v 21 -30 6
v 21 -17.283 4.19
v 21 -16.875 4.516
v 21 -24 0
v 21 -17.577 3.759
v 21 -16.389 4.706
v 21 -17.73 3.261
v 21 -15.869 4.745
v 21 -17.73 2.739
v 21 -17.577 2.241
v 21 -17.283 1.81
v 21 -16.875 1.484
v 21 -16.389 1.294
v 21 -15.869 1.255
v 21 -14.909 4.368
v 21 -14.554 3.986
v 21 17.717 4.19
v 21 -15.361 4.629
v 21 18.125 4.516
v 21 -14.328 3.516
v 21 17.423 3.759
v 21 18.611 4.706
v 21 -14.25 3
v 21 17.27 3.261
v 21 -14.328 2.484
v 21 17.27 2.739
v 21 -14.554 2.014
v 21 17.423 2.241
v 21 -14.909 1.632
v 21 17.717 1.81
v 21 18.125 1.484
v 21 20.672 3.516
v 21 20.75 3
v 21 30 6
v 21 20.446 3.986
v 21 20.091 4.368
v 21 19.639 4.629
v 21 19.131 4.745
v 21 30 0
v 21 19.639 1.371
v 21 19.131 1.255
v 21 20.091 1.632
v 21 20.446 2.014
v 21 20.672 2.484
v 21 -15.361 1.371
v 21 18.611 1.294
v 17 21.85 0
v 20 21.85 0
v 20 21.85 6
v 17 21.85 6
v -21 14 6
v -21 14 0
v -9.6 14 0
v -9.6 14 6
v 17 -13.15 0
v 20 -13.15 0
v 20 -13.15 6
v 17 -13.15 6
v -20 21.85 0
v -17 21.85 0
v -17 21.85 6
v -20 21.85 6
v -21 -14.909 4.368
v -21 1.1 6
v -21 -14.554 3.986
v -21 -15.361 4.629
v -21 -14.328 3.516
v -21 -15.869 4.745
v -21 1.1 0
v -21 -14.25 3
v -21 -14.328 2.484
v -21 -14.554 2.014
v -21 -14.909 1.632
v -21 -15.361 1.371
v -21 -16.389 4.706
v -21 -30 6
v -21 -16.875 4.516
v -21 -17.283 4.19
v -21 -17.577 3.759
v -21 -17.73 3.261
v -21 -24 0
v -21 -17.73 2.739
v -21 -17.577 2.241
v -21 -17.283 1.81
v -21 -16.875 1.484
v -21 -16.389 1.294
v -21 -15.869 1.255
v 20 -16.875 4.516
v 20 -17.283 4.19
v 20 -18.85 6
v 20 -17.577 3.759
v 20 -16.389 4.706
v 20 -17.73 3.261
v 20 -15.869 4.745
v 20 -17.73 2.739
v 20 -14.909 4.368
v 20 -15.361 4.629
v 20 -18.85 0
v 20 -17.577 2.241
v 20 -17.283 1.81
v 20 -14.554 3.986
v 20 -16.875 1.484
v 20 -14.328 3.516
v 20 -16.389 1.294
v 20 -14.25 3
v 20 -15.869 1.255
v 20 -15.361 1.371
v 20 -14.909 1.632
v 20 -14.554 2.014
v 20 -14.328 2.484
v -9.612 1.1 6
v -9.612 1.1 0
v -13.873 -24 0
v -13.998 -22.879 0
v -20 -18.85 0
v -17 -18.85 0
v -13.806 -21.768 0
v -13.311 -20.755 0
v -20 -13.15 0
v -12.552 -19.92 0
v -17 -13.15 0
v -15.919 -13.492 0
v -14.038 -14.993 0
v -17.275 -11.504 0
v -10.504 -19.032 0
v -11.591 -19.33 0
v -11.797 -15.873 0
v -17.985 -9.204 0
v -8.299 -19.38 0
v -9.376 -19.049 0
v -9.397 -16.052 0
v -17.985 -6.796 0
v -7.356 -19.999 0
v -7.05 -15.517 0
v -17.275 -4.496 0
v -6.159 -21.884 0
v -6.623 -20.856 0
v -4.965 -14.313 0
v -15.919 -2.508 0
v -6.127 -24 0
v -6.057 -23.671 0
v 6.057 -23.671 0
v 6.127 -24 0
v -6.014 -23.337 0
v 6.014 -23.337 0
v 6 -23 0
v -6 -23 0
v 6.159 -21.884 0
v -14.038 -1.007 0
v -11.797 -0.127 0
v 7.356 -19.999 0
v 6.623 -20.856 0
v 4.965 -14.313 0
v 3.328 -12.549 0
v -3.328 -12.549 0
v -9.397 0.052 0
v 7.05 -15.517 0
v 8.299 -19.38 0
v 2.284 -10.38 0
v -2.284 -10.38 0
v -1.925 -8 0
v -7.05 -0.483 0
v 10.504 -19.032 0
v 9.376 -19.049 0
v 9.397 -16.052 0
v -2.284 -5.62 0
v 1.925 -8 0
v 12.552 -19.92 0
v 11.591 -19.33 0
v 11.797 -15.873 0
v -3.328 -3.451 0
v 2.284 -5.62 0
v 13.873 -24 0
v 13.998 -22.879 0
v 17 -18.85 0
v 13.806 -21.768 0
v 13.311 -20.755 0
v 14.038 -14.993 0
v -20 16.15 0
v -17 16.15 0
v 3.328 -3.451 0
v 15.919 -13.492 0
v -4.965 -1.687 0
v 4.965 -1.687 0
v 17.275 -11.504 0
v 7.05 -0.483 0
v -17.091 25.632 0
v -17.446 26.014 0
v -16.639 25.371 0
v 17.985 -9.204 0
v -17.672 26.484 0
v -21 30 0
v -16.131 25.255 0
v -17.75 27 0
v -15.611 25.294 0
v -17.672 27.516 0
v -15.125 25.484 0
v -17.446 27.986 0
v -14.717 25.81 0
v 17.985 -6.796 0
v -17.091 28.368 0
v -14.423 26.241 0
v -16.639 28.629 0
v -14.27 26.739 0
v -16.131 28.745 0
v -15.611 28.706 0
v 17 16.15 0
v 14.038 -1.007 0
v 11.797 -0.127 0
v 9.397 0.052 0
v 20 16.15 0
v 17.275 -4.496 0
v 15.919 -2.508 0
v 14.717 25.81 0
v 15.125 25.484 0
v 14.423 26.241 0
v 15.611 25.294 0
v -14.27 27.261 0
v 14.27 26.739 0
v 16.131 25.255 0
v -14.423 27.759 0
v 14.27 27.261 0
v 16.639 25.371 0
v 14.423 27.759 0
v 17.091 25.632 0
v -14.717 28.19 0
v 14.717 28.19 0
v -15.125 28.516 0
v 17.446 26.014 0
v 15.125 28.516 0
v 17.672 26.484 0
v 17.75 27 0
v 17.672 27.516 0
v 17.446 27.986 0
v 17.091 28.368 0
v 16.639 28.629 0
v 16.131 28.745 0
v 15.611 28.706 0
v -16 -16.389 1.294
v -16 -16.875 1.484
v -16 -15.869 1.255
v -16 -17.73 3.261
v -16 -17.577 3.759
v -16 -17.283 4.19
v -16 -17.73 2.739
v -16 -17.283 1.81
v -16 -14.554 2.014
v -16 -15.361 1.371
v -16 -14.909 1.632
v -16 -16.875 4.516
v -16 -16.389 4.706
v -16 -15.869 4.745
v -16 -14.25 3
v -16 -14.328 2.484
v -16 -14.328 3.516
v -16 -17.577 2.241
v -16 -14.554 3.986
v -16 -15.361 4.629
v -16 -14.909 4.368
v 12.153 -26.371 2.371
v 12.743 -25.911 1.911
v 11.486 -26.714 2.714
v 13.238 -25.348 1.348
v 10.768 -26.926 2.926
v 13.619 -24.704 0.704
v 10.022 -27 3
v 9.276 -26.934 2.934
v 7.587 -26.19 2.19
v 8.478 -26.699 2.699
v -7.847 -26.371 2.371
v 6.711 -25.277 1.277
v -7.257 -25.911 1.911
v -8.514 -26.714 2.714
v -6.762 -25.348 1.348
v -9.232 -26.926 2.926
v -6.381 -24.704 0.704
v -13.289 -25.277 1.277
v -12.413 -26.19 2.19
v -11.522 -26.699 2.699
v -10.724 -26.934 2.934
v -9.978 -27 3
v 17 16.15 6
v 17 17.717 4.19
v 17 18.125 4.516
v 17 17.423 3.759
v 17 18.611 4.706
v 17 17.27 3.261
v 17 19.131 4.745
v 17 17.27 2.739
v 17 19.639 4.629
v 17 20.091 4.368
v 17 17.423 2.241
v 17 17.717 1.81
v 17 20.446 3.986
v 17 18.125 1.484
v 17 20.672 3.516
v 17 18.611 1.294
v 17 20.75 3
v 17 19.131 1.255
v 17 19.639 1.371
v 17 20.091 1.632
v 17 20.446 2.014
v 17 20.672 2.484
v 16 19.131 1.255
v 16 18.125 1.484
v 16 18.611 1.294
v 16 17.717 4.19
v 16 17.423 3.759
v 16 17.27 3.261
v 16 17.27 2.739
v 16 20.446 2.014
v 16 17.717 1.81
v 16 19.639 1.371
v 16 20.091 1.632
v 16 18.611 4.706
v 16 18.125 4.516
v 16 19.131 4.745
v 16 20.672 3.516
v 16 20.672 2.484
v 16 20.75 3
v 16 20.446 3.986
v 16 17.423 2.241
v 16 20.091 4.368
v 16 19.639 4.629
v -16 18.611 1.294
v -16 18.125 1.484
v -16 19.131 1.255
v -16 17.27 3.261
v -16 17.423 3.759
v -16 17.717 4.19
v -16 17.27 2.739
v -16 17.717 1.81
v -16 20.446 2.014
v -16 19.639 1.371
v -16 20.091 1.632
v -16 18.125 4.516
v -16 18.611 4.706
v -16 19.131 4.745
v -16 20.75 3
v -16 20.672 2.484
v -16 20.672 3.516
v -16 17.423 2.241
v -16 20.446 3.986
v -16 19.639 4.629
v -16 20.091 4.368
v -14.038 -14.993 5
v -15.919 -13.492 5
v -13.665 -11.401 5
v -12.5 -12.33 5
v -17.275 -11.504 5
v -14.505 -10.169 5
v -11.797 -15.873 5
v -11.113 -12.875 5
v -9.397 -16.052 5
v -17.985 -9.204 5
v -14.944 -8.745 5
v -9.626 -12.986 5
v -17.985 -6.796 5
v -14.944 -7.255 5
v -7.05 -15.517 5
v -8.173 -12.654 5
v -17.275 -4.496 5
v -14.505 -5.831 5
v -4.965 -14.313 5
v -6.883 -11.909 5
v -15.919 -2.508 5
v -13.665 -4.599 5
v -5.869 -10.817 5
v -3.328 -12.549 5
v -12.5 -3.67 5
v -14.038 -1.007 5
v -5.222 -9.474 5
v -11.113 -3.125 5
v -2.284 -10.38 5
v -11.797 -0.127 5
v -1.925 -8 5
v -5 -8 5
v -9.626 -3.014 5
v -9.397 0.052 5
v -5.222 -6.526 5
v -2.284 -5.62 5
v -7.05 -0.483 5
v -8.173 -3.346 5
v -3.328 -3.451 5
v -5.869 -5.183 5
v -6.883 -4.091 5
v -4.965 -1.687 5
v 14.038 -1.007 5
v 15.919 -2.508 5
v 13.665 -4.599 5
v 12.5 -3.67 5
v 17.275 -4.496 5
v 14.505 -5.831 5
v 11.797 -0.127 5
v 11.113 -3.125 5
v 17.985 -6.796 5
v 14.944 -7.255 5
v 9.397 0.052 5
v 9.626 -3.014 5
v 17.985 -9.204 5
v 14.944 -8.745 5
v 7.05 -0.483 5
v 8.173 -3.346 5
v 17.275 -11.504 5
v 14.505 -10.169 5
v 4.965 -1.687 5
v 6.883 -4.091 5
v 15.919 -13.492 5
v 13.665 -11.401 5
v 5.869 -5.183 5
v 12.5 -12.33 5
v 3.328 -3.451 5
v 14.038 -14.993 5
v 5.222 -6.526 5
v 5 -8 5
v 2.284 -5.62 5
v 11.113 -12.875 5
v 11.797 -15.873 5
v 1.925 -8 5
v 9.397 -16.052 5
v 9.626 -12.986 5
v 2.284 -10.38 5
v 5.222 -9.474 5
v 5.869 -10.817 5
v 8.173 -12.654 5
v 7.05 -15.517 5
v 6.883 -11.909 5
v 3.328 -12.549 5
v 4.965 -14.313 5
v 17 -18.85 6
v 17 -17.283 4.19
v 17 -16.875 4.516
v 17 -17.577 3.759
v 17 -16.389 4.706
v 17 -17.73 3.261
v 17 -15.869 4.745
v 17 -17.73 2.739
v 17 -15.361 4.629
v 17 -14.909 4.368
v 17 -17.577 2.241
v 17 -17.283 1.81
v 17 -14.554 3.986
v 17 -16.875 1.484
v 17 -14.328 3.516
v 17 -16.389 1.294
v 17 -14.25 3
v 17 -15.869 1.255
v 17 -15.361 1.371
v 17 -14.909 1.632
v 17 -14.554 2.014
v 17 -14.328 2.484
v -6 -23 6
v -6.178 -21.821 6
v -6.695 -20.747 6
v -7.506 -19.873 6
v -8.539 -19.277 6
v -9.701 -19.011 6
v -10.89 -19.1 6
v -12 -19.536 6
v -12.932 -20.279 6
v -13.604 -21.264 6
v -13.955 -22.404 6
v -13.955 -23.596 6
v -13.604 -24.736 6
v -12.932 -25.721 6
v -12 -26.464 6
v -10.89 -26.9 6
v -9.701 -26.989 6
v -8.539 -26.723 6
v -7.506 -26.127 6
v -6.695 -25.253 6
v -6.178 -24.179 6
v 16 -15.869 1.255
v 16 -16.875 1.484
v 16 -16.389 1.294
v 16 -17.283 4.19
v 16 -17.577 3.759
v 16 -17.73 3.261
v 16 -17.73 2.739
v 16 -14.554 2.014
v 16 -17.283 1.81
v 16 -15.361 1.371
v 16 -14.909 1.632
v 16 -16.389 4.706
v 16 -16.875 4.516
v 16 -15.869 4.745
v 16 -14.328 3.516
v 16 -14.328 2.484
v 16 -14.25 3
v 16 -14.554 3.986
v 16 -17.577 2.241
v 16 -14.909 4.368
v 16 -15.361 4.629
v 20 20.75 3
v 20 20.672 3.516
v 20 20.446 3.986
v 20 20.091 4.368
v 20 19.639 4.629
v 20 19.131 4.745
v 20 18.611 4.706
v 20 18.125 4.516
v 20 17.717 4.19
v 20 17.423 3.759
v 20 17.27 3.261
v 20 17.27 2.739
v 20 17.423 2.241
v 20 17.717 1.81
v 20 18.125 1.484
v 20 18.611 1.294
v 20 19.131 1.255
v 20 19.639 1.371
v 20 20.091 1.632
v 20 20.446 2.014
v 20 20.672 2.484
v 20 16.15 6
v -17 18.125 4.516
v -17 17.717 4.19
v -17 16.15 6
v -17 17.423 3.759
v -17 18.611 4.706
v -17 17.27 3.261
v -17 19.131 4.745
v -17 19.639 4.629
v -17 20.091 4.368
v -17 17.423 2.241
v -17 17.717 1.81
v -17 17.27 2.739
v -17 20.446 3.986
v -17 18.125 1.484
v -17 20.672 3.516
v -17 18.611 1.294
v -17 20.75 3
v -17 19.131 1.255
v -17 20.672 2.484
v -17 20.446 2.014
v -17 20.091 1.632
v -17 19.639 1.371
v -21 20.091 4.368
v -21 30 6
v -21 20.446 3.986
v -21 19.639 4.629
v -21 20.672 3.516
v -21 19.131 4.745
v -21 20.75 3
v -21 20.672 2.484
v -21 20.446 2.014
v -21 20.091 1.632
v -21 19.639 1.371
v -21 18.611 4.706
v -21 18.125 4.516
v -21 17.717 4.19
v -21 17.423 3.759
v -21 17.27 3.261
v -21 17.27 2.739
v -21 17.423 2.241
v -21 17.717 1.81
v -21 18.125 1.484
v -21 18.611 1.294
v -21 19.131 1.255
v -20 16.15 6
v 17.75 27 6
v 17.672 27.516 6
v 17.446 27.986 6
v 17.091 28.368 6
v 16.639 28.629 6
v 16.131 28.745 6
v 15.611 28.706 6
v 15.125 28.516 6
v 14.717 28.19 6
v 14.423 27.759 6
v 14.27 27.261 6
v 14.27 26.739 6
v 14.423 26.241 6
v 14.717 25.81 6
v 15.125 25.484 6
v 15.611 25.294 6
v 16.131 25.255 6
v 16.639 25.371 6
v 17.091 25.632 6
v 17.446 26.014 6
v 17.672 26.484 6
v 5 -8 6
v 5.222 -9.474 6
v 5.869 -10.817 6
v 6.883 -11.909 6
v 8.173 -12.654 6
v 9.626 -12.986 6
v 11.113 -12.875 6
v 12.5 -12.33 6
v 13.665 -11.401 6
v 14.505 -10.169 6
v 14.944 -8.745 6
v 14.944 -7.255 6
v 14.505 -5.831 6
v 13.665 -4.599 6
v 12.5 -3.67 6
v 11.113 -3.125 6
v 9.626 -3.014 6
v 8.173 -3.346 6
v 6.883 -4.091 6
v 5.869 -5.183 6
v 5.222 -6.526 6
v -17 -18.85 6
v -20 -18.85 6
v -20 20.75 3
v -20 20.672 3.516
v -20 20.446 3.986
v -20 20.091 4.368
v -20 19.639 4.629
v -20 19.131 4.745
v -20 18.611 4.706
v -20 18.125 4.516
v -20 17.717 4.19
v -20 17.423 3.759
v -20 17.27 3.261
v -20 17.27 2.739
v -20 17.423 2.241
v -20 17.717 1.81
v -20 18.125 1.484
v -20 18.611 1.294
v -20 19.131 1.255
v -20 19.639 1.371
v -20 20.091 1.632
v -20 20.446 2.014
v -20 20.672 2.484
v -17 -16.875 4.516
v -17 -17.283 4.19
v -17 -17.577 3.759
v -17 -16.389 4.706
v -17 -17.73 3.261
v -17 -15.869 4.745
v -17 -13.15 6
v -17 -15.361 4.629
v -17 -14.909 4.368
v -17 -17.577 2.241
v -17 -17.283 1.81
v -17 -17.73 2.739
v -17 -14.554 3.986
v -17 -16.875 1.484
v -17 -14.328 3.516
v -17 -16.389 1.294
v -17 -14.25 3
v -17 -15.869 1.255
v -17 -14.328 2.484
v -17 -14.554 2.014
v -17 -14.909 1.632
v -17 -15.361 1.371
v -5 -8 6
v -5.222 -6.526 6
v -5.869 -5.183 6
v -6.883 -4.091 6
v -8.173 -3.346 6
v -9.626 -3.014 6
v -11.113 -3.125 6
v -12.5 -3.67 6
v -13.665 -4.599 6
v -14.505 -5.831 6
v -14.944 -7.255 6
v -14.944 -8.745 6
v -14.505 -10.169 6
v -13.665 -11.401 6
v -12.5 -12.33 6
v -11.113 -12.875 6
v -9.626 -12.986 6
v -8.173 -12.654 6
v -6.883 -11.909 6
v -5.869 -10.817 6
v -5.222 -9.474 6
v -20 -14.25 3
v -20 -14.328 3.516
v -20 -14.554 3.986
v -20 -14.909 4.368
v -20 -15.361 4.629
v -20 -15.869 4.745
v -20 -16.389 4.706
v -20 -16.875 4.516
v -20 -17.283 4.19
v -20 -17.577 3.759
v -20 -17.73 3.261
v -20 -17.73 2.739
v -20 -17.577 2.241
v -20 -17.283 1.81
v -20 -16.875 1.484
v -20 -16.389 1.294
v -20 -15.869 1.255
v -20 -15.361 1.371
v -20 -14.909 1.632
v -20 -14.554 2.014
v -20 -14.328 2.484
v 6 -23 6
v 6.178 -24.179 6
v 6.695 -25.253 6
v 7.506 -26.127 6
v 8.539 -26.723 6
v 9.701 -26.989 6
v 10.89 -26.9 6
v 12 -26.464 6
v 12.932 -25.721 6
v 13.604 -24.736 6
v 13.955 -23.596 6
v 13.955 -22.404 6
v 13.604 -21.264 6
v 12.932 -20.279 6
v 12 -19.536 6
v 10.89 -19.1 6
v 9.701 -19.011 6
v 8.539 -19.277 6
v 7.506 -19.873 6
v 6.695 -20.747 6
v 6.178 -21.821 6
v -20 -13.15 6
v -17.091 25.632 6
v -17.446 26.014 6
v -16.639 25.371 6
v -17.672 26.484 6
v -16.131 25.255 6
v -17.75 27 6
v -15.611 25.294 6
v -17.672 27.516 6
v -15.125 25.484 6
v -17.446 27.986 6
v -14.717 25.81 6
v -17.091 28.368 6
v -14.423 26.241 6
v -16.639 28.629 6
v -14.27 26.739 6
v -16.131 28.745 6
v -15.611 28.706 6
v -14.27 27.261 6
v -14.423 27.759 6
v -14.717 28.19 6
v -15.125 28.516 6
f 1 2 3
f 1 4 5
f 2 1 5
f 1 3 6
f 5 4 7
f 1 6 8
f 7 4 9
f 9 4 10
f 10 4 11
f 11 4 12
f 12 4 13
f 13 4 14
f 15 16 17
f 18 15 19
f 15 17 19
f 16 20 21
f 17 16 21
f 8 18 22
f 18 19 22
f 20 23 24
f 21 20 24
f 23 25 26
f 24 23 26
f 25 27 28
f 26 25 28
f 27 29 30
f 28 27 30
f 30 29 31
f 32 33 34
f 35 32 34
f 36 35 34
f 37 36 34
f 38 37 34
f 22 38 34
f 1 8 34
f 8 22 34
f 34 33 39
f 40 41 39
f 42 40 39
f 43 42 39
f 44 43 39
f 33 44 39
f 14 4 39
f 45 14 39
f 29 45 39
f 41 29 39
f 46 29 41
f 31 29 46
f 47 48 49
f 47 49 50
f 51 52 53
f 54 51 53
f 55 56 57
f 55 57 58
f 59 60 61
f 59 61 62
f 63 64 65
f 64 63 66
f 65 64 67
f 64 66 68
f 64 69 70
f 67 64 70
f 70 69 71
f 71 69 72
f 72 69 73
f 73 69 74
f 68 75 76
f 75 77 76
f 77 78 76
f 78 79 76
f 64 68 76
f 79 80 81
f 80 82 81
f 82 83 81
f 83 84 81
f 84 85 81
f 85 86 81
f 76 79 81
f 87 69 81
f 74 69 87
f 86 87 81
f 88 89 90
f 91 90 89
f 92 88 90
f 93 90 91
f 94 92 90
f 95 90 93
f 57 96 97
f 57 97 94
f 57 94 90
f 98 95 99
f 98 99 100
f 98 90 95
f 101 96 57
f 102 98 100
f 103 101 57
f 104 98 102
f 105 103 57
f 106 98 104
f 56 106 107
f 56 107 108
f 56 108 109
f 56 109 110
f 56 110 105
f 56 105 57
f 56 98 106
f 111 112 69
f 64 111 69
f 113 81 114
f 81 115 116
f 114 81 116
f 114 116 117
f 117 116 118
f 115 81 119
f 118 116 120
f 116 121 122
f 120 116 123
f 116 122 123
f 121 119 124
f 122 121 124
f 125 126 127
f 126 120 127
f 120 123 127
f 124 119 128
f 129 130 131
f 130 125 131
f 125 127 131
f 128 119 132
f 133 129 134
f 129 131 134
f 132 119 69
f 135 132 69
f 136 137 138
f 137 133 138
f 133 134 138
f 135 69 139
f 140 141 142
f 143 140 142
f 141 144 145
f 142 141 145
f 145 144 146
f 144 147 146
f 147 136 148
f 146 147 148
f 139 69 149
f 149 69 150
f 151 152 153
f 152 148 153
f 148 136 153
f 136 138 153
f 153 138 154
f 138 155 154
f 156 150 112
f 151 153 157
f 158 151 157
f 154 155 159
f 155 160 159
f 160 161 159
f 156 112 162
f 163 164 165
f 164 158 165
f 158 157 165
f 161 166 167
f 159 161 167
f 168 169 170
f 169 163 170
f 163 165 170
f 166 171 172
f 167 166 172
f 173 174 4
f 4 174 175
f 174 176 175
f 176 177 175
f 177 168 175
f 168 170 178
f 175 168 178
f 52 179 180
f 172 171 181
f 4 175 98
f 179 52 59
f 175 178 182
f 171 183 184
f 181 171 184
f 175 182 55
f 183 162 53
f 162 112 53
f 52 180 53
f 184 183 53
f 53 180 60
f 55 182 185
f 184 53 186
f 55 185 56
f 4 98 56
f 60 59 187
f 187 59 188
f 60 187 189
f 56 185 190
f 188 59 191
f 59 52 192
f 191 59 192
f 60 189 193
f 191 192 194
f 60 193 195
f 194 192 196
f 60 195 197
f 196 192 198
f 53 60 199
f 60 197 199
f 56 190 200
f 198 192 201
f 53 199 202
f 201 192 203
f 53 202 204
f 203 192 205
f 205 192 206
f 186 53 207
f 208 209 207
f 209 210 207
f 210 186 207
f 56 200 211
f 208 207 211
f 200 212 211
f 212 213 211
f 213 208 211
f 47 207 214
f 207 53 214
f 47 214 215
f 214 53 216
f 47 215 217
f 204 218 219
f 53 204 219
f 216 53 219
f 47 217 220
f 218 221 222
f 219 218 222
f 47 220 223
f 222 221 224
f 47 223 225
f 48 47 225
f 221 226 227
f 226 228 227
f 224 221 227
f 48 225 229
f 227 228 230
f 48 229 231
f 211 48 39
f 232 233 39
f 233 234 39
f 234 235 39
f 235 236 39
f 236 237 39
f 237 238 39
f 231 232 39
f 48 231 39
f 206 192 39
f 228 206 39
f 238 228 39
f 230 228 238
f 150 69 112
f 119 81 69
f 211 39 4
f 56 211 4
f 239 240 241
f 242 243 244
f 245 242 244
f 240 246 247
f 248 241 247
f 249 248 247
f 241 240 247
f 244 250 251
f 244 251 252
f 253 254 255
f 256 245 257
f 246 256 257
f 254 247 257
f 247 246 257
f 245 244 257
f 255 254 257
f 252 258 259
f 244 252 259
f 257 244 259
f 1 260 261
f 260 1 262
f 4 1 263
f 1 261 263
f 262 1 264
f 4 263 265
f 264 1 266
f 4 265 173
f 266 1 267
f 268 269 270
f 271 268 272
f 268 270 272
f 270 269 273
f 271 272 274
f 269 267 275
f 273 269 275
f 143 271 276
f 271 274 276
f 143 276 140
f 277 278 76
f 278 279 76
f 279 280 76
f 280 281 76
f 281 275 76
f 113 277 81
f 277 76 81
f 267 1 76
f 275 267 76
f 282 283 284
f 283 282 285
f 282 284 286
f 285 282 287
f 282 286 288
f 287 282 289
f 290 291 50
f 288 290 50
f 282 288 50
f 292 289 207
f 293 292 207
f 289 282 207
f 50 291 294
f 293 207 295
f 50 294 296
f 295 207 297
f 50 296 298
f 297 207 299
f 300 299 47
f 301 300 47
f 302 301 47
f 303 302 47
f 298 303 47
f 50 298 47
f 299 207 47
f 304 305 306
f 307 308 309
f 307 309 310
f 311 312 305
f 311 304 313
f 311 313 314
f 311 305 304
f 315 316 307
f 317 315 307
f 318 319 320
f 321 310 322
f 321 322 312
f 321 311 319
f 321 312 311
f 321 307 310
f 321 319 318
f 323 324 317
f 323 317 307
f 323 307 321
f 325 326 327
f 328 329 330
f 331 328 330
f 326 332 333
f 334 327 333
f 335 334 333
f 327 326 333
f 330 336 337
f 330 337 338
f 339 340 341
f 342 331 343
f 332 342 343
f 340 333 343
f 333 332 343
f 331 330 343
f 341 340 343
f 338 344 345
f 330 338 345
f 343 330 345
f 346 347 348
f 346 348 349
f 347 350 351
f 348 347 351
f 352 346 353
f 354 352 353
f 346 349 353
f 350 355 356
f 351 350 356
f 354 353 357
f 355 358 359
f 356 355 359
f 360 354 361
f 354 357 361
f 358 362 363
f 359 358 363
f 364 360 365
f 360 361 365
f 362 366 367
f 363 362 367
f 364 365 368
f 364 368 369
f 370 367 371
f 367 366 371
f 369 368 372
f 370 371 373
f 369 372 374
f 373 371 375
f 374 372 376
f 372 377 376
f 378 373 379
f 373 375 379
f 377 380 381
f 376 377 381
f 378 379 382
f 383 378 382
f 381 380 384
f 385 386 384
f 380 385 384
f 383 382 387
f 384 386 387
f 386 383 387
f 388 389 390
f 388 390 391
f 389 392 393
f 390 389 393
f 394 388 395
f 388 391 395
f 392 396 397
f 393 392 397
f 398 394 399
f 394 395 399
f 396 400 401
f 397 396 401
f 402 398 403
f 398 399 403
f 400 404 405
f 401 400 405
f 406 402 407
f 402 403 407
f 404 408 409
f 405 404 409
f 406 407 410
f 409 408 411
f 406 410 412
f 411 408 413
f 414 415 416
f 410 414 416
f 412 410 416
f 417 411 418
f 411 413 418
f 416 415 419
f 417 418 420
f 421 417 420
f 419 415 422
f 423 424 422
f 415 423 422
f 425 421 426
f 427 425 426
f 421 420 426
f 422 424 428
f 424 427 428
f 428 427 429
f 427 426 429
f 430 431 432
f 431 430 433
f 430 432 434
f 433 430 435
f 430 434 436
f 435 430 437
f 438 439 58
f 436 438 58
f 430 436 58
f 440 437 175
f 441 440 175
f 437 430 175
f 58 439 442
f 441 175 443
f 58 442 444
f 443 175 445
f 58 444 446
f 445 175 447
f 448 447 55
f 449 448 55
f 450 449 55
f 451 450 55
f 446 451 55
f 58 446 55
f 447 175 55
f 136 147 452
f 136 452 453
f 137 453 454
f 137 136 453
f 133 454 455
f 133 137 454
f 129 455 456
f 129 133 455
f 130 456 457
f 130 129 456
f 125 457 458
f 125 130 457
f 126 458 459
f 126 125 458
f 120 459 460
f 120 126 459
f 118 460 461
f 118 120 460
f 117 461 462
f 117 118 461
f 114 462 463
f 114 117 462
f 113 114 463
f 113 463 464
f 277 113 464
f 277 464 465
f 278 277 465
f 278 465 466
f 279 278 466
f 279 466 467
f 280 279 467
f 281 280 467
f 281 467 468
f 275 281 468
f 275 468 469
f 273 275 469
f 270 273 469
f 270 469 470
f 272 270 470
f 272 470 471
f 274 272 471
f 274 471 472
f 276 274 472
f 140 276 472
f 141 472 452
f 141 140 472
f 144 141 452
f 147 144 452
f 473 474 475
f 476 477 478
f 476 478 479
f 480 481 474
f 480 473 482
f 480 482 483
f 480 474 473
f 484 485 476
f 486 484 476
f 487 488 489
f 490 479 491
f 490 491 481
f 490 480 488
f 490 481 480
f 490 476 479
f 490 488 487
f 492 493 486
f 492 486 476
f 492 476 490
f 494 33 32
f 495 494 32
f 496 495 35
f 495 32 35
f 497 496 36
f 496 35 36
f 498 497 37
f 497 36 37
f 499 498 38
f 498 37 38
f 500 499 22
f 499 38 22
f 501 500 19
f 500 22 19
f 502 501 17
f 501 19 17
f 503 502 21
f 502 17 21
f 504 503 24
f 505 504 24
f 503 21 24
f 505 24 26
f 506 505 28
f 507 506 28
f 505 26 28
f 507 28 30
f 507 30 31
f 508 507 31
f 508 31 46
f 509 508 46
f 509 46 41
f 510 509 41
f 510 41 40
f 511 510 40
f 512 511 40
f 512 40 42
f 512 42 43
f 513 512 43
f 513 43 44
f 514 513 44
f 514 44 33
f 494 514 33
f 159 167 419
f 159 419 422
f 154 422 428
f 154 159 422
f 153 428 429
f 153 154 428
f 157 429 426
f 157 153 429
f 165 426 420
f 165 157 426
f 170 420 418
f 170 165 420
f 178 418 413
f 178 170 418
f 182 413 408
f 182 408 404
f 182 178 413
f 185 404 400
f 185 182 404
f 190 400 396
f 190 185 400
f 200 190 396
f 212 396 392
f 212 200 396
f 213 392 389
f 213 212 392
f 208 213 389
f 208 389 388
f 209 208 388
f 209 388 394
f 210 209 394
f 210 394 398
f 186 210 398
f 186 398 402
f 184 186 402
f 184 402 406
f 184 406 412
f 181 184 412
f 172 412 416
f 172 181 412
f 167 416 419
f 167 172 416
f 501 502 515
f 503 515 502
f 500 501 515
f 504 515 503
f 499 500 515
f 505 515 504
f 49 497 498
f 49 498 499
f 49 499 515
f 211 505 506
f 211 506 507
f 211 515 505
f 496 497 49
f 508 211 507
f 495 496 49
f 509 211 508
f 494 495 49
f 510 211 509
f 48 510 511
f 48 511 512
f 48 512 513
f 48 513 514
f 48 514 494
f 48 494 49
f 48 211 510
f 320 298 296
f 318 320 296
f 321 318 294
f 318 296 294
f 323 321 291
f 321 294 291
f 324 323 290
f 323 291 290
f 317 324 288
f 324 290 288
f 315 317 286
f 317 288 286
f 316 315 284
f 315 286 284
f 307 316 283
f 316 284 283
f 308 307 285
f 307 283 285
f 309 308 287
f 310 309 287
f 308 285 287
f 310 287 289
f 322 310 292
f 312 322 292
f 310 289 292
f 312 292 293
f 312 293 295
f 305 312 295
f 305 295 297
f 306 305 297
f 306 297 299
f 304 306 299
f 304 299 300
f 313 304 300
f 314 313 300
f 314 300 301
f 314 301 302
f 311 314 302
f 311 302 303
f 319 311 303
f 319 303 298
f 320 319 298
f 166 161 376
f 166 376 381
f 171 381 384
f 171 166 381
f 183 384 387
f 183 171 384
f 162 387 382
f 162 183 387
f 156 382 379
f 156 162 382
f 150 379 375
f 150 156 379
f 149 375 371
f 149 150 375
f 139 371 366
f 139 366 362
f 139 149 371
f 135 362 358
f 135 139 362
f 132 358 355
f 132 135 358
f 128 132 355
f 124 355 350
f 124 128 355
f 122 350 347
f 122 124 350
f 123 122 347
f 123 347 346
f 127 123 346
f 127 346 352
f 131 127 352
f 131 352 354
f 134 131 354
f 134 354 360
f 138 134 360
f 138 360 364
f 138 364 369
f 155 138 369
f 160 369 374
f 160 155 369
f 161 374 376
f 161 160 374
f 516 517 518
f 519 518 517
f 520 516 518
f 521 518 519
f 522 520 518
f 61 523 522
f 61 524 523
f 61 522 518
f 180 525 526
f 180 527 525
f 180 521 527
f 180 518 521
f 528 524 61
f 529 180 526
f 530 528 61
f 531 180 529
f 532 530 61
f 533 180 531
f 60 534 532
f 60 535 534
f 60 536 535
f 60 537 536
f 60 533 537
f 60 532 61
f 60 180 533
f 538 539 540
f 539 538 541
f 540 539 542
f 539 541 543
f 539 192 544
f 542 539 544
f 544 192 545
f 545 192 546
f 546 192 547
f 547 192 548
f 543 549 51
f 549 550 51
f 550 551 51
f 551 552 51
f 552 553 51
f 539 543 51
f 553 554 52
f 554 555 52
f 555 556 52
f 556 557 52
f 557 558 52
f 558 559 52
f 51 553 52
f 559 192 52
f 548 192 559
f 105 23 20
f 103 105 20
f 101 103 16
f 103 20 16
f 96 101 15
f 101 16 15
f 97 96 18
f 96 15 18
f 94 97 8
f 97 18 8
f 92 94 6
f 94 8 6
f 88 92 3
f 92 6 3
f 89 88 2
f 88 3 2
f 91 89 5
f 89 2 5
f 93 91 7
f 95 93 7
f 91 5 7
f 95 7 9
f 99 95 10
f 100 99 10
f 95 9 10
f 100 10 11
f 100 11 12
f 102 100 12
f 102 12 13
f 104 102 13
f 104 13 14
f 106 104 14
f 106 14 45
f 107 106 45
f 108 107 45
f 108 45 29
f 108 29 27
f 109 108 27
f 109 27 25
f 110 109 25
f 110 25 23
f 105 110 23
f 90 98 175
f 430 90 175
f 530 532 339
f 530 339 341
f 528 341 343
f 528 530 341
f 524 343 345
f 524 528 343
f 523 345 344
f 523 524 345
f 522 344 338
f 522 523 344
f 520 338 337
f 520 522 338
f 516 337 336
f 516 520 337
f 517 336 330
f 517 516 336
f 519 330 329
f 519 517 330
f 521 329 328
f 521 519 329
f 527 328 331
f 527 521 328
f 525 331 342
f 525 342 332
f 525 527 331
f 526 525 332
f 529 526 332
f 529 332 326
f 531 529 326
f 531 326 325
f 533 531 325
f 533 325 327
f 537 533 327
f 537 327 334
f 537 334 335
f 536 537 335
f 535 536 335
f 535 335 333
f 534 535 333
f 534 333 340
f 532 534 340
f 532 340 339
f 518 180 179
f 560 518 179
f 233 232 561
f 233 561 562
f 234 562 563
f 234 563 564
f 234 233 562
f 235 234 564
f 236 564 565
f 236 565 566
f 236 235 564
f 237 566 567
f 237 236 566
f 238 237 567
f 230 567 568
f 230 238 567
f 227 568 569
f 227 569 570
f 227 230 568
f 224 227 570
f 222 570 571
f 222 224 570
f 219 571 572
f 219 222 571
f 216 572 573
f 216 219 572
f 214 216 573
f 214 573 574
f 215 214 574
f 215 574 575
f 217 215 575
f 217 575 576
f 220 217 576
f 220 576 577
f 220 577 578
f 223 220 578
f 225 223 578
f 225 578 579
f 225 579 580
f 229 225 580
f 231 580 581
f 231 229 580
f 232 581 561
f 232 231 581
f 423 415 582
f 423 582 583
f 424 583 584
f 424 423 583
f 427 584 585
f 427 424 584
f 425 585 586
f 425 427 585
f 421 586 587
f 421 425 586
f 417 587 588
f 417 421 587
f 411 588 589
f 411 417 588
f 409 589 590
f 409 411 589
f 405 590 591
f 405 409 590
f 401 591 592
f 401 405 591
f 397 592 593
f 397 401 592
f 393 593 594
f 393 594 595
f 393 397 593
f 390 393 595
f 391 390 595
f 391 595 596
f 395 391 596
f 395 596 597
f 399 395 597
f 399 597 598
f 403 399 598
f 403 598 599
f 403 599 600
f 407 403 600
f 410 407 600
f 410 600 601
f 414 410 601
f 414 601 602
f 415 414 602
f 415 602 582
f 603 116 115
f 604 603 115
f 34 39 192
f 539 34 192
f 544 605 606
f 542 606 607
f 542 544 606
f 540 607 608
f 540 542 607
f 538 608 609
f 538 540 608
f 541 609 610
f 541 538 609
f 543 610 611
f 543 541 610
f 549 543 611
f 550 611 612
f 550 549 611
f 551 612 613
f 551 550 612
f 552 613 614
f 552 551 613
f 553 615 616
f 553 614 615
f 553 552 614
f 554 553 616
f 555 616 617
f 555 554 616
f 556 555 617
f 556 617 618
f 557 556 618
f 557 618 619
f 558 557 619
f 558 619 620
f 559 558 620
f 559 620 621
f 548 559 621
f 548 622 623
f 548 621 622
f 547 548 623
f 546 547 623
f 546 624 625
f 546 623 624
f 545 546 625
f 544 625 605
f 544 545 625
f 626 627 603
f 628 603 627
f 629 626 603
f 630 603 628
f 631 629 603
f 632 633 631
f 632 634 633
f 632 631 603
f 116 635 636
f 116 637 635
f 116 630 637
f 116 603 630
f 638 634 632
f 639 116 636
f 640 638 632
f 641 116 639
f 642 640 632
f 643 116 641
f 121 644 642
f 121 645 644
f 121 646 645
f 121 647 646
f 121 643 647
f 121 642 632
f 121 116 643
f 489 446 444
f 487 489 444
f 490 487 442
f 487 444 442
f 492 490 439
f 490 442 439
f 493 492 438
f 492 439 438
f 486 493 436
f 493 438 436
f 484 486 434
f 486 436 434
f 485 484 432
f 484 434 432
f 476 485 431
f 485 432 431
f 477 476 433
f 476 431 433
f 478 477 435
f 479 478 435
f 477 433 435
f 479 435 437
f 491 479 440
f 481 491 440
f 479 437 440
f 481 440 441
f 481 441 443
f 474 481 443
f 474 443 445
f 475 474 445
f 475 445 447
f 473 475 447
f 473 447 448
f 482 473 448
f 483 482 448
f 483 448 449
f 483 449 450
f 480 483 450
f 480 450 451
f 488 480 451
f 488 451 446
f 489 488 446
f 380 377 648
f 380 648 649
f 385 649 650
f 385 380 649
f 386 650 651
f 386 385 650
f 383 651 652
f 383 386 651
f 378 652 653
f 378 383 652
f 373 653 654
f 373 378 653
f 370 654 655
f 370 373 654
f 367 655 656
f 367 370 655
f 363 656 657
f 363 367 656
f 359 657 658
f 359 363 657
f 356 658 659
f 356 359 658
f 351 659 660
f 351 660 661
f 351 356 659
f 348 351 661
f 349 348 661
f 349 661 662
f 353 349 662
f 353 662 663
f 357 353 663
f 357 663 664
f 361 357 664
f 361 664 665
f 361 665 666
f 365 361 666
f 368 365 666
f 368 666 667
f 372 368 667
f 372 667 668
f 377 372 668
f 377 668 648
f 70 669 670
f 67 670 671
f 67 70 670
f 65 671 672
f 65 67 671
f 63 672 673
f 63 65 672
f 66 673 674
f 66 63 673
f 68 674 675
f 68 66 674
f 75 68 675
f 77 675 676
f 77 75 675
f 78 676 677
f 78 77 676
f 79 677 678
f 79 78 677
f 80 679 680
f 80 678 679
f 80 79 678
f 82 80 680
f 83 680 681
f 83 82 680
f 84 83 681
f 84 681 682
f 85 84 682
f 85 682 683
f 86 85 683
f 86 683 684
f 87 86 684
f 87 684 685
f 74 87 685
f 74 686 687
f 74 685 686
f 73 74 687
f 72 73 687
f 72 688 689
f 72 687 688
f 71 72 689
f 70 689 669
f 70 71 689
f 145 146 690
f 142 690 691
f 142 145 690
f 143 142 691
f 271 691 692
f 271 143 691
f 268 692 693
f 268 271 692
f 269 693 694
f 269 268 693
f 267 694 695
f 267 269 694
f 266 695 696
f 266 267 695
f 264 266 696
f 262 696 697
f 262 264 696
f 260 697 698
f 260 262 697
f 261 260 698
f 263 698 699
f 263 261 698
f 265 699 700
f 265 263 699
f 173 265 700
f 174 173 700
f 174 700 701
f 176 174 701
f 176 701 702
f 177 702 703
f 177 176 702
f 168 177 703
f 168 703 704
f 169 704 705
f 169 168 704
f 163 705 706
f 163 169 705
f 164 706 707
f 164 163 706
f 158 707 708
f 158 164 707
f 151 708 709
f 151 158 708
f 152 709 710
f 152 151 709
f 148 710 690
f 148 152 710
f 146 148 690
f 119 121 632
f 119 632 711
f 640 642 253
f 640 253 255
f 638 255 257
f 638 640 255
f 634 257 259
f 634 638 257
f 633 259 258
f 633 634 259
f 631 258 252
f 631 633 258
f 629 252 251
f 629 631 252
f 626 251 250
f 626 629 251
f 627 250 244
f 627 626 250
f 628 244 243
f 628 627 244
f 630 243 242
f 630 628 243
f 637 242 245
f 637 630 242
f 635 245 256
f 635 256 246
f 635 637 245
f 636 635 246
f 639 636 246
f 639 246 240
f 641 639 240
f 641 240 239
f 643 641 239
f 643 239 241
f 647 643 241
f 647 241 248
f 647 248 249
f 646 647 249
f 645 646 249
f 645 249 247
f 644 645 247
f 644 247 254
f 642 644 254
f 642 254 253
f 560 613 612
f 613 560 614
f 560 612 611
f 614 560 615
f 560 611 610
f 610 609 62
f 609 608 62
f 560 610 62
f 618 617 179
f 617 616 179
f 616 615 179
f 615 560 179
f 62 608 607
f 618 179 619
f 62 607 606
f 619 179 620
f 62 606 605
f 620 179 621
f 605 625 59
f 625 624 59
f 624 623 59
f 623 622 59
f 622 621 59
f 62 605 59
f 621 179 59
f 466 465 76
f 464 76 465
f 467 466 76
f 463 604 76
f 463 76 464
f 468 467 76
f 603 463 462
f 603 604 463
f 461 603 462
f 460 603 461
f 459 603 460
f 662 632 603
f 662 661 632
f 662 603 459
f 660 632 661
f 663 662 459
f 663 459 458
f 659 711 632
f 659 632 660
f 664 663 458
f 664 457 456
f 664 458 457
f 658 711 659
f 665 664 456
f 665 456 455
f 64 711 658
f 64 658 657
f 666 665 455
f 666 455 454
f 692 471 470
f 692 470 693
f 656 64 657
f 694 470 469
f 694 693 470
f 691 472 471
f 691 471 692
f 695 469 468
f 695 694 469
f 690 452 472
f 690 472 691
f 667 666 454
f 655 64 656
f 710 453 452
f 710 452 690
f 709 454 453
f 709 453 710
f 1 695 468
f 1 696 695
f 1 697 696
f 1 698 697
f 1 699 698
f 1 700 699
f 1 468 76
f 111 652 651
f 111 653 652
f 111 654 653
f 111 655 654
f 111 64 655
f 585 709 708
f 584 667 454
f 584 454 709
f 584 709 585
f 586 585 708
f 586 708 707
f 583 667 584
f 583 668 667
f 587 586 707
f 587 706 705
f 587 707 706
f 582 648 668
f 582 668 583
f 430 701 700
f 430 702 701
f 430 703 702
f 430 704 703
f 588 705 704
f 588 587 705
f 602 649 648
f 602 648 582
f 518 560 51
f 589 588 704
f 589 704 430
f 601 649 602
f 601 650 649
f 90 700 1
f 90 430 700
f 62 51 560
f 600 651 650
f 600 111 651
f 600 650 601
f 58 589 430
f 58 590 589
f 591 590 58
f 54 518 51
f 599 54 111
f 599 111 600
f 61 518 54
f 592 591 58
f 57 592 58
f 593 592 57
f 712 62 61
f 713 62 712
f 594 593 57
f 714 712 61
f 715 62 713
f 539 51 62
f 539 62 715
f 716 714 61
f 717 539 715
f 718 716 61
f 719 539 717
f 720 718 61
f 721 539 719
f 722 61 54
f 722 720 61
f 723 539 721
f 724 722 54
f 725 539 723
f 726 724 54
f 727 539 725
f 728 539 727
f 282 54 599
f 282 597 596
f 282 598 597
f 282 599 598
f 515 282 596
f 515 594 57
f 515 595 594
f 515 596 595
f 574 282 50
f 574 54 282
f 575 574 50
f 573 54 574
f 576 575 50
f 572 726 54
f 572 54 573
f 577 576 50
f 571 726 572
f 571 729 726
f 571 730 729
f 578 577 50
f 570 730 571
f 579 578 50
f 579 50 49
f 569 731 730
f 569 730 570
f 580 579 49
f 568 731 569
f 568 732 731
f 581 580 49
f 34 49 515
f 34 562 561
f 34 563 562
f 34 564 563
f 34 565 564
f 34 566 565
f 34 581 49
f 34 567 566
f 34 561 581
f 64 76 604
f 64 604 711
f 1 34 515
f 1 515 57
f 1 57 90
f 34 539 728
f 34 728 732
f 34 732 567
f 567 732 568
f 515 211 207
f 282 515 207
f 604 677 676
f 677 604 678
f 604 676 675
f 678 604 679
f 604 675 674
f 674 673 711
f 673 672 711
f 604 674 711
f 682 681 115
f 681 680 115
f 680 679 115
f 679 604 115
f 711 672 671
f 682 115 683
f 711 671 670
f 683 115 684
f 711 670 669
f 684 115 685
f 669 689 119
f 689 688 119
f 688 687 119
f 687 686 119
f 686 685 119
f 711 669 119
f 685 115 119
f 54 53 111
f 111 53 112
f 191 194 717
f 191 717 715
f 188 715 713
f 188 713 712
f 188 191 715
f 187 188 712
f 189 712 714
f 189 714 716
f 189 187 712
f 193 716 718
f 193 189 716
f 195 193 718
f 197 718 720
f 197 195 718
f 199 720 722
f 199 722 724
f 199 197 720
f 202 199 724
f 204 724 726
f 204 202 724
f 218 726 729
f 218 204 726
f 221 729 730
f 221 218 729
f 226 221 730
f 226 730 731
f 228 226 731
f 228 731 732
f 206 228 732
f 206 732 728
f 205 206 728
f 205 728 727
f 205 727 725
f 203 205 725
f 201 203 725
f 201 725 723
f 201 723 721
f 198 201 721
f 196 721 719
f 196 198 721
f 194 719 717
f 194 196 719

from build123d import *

# Parameters (mm, degrees)
SKETCH1_R           = 4
SKETCH1_R_2         = 5
SKETCH1_R_3         = 1.75
BOSS_EXTRUDE1_DEPTH = 6
CHAMFER1_SIZE       = 6
CUT_EXTRUDE2_DEPTH  = 10
SKETCH4_W           = 3
SKETCH4_H           = 5.7
CUT_EXTRUDE3_DEPTH  = 38.107950631
CUT_EXTRUDE4_START  = -6
SKETCH2_R           = 8.075
CUT_EXTRUDE4_DEPTH  = 5
SKETCH5_R           = 1.75
CUT_EXTRUDE5_DEPTH  = 5


with BuildPart() as part:
    # Sketch1 → Boss-Extrude1 (new body)
    with BuildSketch(Plane.XY):
        Polygon((-21, -30), (21, -30), (21, 30), (-21, 30), (-21, -8), align=None)
        with Locations((-10, -23)):
            Circle(SKETCH1_R, mode=Mode.SUBTRACT)
        with Locations((-10, -8)):
            Circle(SKETCH1_R_2, mode=Mode.SUBTRACT)
        with Locations(Location((10, -8, 0), (0, 0, 180))):
            Circle(SKETCH1_R_2, mode=Mode.SUBTRACT)
        with Locations(Location((10, -23, 0), (0, 0, 180))):
            Circle(SKETCH1_R, mode=Mode.SUBTRACT)
        with Locations((16, 27)):
            Circle(SKETCH1_R_3, mode=Mode.SUBTRACT)
        with Locations(Location((-16, 27, 0), (0, 0, 180))):
            Circle(SKETCH1_R_3, mode=Mode.SUBTRACT)
    extrude(amount=BOSS_EXTRUDE1_DEPTH)

    # Chamfer1
    # the kernel refuses this chamfer: 6 mm, written as the material it takes off along each edge
    with BuildSketch(Plane(origin=(-36.430097928, -30, 0), x_dir=(0, -0.027495876610586202, 0.9996219169112968), z_dir=(1, 0, 0))) as chamfer1_piece_1:
        Polygon((CHAMFER1_SIZE * 0.999621916911, -CHAMFER1_SIZE * 0.0274958766106), (-CHAMFER1_SIZE * 0.0274958766106, -CHAMFER1_SIZE * 0.999621916911), (0, 0), align=None)
    extrude(amount=72.860195856, mode=Mode.SUBTRACT)

    # Sketch3 → Cut-Extrude2 (cut)
    with BuildSketch(Plane(origin=(0, 0, 0), x_dir=(-1, 0, 0), z_dir=(0, 0, -1))):
        Polygon((9.6, 14), (9.611608629, 1.1), (21, 1.1), (21, 14), align=None)
    extrude(amount=-CUT_EXTRUDE2_DEPTH, mode=Mode.SUBTRACT)

    # Sketch4 → Cut-Extrude3 (cut, through all)
    with BuildSketch(Plane(origin=(0, 0, 0), x_dir=(-1, 0, 0), z_dir=(0, 0, -1))):
        with Locations((-18.5, -16)):
            Rectangle(SKETCH4_W, SKETCH4_H)
        with Locations((18.5, -16)):
            Rectangle(SKETCH4_W, SKETCH4_H)
        with Locations((-18.5, 19)):
            Rectangle(SKETCH4_W, SKETCH4_H)
        with Locations((18.5, 19)):
            Rectangle(SKETCH4_W, SKETCH4_H)
    extrude(amount=-CUT_EXTRUDE3_DEPTH, mode=Mode.SUBTRACT)

    # Sketch2 → Cut-Extrude4 (cut)
    with BuildSketch(Plane.XY.offset(6).offset(CUT_EXTRUDE4_START)):
        with Locations((-10, -8)):
            Circle(SKETCH2_R)
        with Locations(Location((10, -8, 0), (0, 0, 180))):
            Circle(SKETCH2_R)
    extrude(amount=CUT_EXTRUDE4_DEPTH, mode=Mode.SUBTRACT)

    # Sketch5 → Cut-Extrude5 (cut)
    with BuildSketch(Plane(origin=(21, 0, 0), x_dir=(0, 0, -1), z_dir=(1, 0, 0))):
        with Locations(Location((-3, -16, 0), (0, 0, 90))):
            Circle(SKETCH5_R)
        with Locations(Location((-3, 19, 0), (0, 0, 90))):
            Circle(SKETCH5_R)
    cut_extrude5 = extrude(amount=-CUT_EXTRUDE5_DEPTH, mode=Mode.SUBTRACT)

    # Mirror1: Cut-Extrude5 across plane
    add(cut_extrude5.mirror(Plane(origin=(0, 0, 0), x_dir=(0, 0, 1), z_dir=(1, 0, 0))), mode=Mode.SUBTRACT)


solid = part.part
